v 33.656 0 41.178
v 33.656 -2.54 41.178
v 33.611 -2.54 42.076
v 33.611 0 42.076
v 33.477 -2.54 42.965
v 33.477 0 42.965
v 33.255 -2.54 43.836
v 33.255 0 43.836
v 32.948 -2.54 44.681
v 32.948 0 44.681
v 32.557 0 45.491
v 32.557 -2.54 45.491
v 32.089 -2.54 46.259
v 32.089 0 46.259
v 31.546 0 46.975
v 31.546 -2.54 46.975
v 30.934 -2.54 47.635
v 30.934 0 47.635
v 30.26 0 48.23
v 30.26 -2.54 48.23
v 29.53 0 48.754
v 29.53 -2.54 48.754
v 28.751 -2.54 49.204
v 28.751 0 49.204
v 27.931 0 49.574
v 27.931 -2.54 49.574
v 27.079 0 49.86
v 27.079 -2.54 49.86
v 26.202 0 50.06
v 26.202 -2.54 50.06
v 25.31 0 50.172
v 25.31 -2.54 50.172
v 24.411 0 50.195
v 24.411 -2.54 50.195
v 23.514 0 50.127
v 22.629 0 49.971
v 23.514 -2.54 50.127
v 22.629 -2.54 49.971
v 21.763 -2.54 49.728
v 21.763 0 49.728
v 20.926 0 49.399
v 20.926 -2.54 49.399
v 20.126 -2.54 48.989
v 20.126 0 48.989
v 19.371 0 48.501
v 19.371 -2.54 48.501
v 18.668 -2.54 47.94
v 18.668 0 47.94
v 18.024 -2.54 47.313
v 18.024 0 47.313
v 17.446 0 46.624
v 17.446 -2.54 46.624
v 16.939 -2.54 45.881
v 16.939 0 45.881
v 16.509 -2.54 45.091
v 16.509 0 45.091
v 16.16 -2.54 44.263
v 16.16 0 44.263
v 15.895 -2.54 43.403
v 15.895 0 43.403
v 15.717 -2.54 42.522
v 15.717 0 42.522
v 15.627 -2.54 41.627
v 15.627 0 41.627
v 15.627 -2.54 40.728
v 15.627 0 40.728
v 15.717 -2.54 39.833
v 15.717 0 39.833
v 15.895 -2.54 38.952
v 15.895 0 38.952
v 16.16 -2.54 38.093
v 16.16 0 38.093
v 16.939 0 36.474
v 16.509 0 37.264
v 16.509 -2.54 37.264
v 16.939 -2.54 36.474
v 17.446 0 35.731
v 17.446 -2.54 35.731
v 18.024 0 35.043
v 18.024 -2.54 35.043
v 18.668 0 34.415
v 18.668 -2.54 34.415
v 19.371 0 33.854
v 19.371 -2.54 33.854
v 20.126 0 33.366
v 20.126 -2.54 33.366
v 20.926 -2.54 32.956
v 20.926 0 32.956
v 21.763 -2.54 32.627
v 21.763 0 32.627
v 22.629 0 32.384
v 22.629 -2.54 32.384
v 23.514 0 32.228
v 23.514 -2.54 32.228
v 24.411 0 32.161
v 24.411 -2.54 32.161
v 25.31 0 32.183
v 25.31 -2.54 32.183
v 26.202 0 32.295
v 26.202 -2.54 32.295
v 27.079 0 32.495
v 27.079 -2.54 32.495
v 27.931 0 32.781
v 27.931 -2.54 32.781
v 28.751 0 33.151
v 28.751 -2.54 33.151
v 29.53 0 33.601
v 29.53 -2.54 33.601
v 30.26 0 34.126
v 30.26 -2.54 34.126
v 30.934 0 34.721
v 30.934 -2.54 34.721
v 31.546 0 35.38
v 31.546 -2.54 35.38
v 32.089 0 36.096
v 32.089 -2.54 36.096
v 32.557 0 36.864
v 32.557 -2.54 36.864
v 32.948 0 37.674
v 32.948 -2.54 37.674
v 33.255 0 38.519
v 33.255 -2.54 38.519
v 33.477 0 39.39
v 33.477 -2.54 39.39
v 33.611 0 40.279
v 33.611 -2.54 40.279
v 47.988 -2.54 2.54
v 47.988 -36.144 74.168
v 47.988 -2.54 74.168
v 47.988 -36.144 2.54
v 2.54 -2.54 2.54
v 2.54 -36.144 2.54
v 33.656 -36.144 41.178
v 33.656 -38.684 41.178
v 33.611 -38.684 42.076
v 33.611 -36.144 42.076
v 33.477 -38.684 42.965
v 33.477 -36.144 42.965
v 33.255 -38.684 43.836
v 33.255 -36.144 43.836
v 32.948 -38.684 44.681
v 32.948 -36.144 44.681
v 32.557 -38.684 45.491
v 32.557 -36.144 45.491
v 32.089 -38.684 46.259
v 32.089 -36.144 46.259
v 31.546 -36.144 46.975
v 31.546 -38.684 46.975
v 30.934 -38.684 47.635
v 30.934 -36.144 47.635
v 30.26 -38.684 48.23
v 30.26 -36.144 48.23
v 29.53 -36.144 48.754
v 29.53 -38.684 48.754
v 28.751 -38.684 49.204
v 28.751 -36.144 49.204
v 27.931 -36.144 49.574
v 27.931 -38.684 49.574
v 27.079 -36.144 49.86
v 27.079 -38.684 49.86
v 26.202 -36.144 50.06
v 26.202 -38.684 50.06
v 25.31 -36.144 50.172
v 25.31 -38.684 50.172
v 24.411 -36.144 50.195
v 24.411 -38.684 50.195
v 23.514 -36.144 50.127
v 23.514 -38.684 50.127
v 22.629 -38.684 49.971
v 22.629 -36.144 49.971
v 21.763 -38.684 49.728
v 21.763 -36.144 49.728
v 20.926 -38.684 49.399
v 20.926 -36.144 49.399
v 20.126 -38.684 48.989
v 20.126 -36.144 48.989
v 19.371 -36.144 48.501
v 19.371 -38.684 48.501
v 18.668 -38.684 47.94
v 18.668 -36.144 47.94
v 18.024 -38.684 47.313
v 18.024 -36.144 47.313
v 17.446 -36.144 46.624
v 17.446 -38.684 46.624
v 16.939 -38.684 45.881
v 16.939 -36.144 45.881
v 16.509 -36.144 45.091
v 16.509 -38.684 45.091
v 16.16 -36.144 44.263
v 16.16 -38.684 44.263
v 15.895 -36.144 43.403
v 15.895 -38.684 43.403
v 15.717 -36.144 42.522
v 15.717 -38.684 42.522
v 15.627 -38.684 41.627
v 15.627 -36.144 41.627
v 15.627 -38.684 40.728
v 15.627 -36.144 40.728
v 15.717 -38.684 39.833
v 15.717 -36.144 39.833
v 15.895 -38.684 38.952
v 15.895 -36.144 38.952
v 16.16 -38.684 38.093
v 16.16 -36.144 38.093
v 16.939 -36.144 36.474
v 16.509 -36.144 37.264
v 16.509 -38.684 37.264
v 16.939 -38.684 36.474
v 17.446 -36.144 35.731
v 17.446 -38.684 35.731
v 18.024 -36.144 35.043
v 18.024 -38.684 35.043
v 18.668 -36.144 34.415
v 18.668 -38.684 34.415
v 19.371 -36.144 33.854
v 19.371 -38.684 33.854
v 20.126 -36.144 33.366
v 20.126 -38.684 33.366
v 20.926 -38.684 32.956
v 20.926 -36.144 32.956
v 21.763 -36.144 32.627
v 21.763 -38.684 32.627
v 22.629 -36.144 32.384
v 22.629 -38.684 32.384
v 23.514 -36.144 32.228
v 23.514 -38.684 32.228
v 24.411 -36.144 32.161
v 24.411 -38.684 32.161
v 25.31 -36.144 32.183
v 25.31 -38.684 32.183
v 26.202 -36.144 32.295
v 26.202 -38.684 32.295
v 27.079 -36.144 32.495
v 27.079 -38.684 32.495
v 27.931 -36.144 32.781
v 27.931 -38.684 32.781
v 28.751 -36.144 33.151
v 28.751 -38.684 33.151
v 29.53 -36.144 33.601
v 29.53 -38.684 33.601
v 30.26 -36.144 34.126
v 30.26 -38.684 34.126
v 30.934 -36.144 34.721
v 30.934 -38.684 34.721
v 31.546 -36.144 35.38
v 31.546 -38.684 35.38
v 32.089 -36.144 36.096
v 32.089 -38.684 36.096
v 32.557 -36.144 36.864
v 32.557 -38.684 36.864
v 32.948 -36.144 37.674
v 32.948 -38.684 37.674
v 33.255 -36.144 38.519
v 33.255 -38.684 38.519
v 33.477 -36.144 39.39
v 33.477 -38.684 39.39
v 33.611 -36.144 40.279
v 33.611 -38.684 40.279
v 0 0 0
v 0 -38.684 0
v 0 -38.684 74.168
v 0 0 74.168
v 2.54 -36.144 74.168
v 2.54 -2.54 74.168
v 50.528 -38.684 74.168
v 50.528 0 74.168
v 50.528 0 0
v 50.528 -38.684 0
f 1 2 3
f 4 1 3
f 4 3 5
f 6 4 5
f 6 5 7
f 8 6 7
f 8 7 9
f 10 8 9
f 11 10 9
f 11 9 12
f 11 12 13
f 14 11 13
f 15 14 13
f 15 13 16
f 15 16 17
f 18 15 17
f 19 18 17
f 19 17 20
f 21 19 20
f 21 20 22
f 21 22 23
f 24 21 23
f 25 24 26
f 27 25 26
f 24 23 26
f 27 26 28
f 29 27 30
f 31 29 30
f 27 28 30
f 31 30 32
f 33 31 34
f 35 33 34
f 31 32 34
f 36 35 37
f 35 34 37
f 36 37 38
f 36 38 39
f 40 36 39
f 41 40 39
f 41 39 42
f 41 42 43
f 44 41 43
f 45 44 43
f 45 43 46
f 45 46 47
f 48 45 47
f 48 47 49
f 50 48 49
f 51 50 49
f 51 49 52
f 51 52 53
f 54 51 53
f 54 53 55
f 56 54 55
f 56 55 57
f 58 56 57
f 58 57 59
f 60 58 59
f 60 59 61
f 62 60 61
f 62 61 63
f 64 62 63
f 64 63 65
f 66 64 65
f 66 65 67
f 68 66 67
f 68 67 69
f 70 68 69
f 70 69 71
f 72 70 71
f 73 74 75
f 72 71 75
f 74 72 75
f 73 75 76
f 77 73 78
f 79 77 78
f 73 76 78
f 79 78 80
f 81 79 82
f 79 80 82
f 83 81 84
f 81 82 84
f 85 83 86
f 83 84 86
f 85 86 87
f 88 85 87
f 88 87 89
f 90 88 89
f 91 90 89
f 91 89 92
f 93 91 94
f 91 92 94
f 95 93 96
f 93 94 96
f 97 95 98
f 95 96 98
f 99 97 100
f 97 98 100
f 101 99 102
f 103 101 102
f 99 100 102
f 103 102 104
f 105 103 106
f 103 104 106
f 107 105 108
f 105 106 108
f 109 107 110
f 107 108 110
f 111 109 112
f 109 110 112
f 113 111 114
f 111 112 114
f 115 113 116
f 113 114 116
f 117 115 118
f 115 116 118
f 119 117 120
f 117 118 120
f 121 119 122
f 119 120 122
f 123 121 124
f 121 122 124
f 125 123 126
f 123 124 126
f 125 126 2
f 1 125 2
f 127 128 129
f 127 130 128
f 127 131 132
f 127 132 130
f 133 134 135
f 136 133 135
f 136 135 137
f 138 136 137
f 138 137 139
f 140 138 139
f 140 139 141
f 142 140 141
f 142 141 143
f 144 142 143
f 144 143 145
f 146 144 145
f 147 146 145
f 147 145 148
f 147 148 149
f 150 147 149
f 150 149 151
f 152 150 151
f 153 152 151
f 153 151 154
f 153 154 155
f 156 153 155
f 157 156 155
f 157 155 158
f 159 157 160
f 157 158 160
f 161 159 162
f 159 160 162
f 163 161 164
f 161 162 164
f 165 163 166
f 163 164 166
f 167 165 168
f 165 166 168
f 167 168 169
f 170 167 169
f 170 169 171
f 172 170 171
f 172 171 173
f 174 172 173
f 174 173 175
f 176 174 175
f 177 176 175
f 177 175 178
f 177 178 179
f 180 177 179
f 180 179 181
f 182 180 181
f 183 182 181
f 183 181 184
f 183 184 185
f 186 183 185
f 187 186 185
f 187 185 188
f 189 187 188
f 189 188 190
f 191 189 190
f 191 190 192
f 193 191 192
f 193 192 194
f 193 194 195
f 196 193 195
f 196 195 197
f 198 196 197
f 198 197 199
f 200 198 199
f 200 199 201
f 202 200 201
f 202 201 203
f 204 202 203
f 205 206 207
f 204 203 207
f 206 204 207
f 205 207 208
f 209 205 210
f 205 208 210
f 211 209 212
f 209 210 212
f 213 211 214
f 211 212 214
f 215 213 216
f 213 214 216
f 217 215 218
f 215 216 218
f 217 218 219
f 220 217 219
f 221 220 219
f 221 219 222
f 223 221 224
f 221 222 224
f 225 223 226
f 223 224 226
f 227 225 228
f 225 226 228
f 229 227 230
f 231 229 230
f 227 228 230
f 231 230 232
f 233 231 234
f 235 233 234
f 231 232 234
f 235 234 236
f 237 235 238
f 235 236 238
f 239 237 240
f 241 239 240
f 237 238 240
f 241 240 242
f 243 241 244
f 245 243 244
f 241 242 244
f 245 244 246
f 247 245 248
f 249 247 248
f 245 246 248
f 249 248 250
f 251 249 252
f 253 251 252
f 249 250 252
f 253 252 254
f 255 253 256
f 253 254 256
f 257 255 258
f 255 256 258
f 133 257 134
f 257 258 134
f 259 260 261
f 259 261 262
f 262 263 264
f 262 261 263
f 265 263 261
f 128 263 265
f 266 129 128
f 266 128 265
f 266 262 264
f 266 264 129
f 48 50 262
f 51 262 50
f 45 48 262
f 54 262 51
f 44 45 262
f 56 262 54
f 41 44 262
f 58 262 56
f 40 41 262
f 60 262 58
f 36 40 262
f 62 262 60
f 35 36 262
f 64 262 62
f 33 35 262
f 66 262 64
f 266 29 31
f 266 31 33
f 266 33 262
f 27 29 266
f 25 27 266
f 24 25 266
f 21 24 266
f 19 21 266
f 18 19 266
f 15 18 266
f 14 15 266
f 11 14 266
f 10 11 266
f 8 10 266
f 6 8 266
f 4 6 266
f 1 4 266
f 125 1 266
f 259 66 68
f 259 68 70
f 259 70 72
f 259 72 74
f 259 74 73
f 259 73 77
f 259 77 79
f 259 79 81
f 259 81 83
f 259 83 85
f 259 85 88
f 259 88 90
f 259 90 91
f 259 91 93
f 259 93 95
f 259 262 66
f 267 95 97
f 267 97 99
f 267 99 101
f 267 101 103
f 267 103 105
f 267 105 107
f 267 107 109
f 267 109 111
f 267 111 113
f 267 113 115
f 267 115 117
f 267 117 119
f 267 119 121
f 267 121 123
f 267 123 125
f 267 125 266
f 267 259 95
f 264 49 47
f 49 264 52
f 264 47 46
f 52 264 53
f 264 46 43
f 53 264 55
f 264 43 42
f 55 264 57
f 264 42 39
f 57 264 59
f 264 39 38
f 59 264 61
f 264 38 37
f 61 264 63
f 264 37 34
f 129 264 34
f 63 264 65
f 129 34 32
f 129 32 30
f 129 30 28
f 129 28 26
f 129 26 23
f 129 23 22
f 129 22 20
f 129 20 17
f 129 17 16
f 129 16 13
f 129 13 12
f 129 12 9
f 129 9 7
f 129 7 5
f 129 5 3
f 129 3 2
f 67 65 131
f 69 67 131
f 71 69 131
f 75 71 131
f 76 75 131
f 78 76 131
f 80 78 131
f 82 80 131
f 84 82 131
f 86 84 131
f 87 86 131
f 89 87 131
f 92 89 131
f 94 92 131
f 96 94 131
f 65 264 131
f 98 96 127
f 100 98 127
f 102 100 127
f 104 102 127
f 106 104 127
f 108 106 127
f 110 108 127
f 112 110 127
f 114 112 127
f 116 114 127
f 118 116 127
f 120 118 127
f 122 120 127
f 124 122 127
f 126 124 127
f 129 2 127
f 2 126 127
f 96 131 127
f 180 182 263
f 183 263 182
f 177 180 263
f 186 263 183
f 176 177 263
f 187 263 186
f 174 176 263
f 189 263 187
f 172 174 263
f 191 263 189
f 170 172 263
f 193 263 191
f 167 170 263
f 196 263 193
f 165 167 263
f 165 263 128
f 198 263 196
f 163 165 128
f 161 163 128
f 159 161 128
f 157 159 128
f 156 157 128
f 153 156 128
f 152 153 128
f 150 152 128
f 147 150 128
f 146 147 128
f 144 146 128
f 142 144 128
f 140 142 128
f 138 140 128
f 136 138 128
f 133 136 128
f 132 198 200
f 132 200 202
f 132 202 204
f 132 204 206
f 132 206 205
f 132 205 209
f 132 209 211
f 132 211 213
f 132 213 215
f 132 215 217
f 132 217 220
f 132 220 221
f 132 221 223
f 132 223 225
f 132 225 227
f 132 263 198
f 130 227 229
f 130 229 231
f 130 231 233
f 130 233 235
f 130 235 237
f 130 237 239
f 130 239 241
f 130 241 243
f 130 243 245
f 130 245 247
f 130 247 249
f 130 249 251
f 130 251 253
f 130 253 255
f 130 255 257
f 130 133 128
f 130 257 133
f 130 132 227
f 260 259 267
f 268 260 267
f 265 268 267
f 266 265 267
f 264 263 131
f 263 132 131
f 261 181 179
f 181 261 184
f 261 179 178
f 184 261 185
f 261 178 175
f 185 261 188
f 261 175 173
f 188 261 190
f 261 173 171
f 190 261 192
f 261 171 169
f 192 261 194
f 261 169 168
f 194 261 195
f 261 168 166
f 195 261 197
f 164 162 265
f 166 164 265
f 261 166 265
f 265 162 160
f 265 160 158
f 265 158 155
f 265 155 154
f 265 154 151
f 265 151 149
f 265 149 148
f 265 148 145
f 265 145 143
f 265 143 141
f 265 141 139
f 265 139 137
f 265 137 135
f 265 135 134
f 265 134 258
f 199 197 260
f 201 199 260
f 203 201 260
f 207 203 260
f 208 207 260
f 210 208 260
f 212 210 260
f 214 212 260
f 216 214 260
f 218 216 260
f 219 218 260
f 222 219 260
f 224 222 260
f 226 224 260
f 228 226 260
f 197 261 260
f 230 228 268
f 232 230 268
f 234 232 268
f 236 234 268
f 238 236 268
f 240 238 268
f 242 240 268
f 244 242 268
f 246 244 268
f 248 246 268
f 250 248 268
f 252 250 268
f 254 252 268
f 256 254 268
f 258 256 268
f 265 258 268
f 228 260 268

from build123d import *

# Parameters (mm, degrees)
F0_W     = 50.5277775228
F0_H     = 38.6841930449
F1_DEPTH = 74.168
F2_T     = -2.54
F3_R     = 9.0198311592
F4_DEPTH = 71.882


with BuildPart() as f1:
    # F0 (on Top) → F1 (new body)
    with BuildSketch(Plane.XY):
        with Locations((25.2638887614, -19.3420965225)):
            Rectangle(F0_W, F0_H)
    extrude(amount=F1_DEPTH)

    # F2
    f2_openings = [f1.faces().sort_by_distance(p)[0] for p in [
        (25.263889, -19.342097, 74.168),
    ]]
    offset(amount=F2_T, openings=f2_openings)

    # F3 (on face) → F4 (cut)
    with BuildSketch(Plane.XZ.offset(38.6841930449)):
        with Locations((24.6360246092, 41.1775447428)):
            Circle(F3_R)
    extrude(amount=-F4_DEPTH, mode=Mode.SUBTRACT)


solid = f1.part
